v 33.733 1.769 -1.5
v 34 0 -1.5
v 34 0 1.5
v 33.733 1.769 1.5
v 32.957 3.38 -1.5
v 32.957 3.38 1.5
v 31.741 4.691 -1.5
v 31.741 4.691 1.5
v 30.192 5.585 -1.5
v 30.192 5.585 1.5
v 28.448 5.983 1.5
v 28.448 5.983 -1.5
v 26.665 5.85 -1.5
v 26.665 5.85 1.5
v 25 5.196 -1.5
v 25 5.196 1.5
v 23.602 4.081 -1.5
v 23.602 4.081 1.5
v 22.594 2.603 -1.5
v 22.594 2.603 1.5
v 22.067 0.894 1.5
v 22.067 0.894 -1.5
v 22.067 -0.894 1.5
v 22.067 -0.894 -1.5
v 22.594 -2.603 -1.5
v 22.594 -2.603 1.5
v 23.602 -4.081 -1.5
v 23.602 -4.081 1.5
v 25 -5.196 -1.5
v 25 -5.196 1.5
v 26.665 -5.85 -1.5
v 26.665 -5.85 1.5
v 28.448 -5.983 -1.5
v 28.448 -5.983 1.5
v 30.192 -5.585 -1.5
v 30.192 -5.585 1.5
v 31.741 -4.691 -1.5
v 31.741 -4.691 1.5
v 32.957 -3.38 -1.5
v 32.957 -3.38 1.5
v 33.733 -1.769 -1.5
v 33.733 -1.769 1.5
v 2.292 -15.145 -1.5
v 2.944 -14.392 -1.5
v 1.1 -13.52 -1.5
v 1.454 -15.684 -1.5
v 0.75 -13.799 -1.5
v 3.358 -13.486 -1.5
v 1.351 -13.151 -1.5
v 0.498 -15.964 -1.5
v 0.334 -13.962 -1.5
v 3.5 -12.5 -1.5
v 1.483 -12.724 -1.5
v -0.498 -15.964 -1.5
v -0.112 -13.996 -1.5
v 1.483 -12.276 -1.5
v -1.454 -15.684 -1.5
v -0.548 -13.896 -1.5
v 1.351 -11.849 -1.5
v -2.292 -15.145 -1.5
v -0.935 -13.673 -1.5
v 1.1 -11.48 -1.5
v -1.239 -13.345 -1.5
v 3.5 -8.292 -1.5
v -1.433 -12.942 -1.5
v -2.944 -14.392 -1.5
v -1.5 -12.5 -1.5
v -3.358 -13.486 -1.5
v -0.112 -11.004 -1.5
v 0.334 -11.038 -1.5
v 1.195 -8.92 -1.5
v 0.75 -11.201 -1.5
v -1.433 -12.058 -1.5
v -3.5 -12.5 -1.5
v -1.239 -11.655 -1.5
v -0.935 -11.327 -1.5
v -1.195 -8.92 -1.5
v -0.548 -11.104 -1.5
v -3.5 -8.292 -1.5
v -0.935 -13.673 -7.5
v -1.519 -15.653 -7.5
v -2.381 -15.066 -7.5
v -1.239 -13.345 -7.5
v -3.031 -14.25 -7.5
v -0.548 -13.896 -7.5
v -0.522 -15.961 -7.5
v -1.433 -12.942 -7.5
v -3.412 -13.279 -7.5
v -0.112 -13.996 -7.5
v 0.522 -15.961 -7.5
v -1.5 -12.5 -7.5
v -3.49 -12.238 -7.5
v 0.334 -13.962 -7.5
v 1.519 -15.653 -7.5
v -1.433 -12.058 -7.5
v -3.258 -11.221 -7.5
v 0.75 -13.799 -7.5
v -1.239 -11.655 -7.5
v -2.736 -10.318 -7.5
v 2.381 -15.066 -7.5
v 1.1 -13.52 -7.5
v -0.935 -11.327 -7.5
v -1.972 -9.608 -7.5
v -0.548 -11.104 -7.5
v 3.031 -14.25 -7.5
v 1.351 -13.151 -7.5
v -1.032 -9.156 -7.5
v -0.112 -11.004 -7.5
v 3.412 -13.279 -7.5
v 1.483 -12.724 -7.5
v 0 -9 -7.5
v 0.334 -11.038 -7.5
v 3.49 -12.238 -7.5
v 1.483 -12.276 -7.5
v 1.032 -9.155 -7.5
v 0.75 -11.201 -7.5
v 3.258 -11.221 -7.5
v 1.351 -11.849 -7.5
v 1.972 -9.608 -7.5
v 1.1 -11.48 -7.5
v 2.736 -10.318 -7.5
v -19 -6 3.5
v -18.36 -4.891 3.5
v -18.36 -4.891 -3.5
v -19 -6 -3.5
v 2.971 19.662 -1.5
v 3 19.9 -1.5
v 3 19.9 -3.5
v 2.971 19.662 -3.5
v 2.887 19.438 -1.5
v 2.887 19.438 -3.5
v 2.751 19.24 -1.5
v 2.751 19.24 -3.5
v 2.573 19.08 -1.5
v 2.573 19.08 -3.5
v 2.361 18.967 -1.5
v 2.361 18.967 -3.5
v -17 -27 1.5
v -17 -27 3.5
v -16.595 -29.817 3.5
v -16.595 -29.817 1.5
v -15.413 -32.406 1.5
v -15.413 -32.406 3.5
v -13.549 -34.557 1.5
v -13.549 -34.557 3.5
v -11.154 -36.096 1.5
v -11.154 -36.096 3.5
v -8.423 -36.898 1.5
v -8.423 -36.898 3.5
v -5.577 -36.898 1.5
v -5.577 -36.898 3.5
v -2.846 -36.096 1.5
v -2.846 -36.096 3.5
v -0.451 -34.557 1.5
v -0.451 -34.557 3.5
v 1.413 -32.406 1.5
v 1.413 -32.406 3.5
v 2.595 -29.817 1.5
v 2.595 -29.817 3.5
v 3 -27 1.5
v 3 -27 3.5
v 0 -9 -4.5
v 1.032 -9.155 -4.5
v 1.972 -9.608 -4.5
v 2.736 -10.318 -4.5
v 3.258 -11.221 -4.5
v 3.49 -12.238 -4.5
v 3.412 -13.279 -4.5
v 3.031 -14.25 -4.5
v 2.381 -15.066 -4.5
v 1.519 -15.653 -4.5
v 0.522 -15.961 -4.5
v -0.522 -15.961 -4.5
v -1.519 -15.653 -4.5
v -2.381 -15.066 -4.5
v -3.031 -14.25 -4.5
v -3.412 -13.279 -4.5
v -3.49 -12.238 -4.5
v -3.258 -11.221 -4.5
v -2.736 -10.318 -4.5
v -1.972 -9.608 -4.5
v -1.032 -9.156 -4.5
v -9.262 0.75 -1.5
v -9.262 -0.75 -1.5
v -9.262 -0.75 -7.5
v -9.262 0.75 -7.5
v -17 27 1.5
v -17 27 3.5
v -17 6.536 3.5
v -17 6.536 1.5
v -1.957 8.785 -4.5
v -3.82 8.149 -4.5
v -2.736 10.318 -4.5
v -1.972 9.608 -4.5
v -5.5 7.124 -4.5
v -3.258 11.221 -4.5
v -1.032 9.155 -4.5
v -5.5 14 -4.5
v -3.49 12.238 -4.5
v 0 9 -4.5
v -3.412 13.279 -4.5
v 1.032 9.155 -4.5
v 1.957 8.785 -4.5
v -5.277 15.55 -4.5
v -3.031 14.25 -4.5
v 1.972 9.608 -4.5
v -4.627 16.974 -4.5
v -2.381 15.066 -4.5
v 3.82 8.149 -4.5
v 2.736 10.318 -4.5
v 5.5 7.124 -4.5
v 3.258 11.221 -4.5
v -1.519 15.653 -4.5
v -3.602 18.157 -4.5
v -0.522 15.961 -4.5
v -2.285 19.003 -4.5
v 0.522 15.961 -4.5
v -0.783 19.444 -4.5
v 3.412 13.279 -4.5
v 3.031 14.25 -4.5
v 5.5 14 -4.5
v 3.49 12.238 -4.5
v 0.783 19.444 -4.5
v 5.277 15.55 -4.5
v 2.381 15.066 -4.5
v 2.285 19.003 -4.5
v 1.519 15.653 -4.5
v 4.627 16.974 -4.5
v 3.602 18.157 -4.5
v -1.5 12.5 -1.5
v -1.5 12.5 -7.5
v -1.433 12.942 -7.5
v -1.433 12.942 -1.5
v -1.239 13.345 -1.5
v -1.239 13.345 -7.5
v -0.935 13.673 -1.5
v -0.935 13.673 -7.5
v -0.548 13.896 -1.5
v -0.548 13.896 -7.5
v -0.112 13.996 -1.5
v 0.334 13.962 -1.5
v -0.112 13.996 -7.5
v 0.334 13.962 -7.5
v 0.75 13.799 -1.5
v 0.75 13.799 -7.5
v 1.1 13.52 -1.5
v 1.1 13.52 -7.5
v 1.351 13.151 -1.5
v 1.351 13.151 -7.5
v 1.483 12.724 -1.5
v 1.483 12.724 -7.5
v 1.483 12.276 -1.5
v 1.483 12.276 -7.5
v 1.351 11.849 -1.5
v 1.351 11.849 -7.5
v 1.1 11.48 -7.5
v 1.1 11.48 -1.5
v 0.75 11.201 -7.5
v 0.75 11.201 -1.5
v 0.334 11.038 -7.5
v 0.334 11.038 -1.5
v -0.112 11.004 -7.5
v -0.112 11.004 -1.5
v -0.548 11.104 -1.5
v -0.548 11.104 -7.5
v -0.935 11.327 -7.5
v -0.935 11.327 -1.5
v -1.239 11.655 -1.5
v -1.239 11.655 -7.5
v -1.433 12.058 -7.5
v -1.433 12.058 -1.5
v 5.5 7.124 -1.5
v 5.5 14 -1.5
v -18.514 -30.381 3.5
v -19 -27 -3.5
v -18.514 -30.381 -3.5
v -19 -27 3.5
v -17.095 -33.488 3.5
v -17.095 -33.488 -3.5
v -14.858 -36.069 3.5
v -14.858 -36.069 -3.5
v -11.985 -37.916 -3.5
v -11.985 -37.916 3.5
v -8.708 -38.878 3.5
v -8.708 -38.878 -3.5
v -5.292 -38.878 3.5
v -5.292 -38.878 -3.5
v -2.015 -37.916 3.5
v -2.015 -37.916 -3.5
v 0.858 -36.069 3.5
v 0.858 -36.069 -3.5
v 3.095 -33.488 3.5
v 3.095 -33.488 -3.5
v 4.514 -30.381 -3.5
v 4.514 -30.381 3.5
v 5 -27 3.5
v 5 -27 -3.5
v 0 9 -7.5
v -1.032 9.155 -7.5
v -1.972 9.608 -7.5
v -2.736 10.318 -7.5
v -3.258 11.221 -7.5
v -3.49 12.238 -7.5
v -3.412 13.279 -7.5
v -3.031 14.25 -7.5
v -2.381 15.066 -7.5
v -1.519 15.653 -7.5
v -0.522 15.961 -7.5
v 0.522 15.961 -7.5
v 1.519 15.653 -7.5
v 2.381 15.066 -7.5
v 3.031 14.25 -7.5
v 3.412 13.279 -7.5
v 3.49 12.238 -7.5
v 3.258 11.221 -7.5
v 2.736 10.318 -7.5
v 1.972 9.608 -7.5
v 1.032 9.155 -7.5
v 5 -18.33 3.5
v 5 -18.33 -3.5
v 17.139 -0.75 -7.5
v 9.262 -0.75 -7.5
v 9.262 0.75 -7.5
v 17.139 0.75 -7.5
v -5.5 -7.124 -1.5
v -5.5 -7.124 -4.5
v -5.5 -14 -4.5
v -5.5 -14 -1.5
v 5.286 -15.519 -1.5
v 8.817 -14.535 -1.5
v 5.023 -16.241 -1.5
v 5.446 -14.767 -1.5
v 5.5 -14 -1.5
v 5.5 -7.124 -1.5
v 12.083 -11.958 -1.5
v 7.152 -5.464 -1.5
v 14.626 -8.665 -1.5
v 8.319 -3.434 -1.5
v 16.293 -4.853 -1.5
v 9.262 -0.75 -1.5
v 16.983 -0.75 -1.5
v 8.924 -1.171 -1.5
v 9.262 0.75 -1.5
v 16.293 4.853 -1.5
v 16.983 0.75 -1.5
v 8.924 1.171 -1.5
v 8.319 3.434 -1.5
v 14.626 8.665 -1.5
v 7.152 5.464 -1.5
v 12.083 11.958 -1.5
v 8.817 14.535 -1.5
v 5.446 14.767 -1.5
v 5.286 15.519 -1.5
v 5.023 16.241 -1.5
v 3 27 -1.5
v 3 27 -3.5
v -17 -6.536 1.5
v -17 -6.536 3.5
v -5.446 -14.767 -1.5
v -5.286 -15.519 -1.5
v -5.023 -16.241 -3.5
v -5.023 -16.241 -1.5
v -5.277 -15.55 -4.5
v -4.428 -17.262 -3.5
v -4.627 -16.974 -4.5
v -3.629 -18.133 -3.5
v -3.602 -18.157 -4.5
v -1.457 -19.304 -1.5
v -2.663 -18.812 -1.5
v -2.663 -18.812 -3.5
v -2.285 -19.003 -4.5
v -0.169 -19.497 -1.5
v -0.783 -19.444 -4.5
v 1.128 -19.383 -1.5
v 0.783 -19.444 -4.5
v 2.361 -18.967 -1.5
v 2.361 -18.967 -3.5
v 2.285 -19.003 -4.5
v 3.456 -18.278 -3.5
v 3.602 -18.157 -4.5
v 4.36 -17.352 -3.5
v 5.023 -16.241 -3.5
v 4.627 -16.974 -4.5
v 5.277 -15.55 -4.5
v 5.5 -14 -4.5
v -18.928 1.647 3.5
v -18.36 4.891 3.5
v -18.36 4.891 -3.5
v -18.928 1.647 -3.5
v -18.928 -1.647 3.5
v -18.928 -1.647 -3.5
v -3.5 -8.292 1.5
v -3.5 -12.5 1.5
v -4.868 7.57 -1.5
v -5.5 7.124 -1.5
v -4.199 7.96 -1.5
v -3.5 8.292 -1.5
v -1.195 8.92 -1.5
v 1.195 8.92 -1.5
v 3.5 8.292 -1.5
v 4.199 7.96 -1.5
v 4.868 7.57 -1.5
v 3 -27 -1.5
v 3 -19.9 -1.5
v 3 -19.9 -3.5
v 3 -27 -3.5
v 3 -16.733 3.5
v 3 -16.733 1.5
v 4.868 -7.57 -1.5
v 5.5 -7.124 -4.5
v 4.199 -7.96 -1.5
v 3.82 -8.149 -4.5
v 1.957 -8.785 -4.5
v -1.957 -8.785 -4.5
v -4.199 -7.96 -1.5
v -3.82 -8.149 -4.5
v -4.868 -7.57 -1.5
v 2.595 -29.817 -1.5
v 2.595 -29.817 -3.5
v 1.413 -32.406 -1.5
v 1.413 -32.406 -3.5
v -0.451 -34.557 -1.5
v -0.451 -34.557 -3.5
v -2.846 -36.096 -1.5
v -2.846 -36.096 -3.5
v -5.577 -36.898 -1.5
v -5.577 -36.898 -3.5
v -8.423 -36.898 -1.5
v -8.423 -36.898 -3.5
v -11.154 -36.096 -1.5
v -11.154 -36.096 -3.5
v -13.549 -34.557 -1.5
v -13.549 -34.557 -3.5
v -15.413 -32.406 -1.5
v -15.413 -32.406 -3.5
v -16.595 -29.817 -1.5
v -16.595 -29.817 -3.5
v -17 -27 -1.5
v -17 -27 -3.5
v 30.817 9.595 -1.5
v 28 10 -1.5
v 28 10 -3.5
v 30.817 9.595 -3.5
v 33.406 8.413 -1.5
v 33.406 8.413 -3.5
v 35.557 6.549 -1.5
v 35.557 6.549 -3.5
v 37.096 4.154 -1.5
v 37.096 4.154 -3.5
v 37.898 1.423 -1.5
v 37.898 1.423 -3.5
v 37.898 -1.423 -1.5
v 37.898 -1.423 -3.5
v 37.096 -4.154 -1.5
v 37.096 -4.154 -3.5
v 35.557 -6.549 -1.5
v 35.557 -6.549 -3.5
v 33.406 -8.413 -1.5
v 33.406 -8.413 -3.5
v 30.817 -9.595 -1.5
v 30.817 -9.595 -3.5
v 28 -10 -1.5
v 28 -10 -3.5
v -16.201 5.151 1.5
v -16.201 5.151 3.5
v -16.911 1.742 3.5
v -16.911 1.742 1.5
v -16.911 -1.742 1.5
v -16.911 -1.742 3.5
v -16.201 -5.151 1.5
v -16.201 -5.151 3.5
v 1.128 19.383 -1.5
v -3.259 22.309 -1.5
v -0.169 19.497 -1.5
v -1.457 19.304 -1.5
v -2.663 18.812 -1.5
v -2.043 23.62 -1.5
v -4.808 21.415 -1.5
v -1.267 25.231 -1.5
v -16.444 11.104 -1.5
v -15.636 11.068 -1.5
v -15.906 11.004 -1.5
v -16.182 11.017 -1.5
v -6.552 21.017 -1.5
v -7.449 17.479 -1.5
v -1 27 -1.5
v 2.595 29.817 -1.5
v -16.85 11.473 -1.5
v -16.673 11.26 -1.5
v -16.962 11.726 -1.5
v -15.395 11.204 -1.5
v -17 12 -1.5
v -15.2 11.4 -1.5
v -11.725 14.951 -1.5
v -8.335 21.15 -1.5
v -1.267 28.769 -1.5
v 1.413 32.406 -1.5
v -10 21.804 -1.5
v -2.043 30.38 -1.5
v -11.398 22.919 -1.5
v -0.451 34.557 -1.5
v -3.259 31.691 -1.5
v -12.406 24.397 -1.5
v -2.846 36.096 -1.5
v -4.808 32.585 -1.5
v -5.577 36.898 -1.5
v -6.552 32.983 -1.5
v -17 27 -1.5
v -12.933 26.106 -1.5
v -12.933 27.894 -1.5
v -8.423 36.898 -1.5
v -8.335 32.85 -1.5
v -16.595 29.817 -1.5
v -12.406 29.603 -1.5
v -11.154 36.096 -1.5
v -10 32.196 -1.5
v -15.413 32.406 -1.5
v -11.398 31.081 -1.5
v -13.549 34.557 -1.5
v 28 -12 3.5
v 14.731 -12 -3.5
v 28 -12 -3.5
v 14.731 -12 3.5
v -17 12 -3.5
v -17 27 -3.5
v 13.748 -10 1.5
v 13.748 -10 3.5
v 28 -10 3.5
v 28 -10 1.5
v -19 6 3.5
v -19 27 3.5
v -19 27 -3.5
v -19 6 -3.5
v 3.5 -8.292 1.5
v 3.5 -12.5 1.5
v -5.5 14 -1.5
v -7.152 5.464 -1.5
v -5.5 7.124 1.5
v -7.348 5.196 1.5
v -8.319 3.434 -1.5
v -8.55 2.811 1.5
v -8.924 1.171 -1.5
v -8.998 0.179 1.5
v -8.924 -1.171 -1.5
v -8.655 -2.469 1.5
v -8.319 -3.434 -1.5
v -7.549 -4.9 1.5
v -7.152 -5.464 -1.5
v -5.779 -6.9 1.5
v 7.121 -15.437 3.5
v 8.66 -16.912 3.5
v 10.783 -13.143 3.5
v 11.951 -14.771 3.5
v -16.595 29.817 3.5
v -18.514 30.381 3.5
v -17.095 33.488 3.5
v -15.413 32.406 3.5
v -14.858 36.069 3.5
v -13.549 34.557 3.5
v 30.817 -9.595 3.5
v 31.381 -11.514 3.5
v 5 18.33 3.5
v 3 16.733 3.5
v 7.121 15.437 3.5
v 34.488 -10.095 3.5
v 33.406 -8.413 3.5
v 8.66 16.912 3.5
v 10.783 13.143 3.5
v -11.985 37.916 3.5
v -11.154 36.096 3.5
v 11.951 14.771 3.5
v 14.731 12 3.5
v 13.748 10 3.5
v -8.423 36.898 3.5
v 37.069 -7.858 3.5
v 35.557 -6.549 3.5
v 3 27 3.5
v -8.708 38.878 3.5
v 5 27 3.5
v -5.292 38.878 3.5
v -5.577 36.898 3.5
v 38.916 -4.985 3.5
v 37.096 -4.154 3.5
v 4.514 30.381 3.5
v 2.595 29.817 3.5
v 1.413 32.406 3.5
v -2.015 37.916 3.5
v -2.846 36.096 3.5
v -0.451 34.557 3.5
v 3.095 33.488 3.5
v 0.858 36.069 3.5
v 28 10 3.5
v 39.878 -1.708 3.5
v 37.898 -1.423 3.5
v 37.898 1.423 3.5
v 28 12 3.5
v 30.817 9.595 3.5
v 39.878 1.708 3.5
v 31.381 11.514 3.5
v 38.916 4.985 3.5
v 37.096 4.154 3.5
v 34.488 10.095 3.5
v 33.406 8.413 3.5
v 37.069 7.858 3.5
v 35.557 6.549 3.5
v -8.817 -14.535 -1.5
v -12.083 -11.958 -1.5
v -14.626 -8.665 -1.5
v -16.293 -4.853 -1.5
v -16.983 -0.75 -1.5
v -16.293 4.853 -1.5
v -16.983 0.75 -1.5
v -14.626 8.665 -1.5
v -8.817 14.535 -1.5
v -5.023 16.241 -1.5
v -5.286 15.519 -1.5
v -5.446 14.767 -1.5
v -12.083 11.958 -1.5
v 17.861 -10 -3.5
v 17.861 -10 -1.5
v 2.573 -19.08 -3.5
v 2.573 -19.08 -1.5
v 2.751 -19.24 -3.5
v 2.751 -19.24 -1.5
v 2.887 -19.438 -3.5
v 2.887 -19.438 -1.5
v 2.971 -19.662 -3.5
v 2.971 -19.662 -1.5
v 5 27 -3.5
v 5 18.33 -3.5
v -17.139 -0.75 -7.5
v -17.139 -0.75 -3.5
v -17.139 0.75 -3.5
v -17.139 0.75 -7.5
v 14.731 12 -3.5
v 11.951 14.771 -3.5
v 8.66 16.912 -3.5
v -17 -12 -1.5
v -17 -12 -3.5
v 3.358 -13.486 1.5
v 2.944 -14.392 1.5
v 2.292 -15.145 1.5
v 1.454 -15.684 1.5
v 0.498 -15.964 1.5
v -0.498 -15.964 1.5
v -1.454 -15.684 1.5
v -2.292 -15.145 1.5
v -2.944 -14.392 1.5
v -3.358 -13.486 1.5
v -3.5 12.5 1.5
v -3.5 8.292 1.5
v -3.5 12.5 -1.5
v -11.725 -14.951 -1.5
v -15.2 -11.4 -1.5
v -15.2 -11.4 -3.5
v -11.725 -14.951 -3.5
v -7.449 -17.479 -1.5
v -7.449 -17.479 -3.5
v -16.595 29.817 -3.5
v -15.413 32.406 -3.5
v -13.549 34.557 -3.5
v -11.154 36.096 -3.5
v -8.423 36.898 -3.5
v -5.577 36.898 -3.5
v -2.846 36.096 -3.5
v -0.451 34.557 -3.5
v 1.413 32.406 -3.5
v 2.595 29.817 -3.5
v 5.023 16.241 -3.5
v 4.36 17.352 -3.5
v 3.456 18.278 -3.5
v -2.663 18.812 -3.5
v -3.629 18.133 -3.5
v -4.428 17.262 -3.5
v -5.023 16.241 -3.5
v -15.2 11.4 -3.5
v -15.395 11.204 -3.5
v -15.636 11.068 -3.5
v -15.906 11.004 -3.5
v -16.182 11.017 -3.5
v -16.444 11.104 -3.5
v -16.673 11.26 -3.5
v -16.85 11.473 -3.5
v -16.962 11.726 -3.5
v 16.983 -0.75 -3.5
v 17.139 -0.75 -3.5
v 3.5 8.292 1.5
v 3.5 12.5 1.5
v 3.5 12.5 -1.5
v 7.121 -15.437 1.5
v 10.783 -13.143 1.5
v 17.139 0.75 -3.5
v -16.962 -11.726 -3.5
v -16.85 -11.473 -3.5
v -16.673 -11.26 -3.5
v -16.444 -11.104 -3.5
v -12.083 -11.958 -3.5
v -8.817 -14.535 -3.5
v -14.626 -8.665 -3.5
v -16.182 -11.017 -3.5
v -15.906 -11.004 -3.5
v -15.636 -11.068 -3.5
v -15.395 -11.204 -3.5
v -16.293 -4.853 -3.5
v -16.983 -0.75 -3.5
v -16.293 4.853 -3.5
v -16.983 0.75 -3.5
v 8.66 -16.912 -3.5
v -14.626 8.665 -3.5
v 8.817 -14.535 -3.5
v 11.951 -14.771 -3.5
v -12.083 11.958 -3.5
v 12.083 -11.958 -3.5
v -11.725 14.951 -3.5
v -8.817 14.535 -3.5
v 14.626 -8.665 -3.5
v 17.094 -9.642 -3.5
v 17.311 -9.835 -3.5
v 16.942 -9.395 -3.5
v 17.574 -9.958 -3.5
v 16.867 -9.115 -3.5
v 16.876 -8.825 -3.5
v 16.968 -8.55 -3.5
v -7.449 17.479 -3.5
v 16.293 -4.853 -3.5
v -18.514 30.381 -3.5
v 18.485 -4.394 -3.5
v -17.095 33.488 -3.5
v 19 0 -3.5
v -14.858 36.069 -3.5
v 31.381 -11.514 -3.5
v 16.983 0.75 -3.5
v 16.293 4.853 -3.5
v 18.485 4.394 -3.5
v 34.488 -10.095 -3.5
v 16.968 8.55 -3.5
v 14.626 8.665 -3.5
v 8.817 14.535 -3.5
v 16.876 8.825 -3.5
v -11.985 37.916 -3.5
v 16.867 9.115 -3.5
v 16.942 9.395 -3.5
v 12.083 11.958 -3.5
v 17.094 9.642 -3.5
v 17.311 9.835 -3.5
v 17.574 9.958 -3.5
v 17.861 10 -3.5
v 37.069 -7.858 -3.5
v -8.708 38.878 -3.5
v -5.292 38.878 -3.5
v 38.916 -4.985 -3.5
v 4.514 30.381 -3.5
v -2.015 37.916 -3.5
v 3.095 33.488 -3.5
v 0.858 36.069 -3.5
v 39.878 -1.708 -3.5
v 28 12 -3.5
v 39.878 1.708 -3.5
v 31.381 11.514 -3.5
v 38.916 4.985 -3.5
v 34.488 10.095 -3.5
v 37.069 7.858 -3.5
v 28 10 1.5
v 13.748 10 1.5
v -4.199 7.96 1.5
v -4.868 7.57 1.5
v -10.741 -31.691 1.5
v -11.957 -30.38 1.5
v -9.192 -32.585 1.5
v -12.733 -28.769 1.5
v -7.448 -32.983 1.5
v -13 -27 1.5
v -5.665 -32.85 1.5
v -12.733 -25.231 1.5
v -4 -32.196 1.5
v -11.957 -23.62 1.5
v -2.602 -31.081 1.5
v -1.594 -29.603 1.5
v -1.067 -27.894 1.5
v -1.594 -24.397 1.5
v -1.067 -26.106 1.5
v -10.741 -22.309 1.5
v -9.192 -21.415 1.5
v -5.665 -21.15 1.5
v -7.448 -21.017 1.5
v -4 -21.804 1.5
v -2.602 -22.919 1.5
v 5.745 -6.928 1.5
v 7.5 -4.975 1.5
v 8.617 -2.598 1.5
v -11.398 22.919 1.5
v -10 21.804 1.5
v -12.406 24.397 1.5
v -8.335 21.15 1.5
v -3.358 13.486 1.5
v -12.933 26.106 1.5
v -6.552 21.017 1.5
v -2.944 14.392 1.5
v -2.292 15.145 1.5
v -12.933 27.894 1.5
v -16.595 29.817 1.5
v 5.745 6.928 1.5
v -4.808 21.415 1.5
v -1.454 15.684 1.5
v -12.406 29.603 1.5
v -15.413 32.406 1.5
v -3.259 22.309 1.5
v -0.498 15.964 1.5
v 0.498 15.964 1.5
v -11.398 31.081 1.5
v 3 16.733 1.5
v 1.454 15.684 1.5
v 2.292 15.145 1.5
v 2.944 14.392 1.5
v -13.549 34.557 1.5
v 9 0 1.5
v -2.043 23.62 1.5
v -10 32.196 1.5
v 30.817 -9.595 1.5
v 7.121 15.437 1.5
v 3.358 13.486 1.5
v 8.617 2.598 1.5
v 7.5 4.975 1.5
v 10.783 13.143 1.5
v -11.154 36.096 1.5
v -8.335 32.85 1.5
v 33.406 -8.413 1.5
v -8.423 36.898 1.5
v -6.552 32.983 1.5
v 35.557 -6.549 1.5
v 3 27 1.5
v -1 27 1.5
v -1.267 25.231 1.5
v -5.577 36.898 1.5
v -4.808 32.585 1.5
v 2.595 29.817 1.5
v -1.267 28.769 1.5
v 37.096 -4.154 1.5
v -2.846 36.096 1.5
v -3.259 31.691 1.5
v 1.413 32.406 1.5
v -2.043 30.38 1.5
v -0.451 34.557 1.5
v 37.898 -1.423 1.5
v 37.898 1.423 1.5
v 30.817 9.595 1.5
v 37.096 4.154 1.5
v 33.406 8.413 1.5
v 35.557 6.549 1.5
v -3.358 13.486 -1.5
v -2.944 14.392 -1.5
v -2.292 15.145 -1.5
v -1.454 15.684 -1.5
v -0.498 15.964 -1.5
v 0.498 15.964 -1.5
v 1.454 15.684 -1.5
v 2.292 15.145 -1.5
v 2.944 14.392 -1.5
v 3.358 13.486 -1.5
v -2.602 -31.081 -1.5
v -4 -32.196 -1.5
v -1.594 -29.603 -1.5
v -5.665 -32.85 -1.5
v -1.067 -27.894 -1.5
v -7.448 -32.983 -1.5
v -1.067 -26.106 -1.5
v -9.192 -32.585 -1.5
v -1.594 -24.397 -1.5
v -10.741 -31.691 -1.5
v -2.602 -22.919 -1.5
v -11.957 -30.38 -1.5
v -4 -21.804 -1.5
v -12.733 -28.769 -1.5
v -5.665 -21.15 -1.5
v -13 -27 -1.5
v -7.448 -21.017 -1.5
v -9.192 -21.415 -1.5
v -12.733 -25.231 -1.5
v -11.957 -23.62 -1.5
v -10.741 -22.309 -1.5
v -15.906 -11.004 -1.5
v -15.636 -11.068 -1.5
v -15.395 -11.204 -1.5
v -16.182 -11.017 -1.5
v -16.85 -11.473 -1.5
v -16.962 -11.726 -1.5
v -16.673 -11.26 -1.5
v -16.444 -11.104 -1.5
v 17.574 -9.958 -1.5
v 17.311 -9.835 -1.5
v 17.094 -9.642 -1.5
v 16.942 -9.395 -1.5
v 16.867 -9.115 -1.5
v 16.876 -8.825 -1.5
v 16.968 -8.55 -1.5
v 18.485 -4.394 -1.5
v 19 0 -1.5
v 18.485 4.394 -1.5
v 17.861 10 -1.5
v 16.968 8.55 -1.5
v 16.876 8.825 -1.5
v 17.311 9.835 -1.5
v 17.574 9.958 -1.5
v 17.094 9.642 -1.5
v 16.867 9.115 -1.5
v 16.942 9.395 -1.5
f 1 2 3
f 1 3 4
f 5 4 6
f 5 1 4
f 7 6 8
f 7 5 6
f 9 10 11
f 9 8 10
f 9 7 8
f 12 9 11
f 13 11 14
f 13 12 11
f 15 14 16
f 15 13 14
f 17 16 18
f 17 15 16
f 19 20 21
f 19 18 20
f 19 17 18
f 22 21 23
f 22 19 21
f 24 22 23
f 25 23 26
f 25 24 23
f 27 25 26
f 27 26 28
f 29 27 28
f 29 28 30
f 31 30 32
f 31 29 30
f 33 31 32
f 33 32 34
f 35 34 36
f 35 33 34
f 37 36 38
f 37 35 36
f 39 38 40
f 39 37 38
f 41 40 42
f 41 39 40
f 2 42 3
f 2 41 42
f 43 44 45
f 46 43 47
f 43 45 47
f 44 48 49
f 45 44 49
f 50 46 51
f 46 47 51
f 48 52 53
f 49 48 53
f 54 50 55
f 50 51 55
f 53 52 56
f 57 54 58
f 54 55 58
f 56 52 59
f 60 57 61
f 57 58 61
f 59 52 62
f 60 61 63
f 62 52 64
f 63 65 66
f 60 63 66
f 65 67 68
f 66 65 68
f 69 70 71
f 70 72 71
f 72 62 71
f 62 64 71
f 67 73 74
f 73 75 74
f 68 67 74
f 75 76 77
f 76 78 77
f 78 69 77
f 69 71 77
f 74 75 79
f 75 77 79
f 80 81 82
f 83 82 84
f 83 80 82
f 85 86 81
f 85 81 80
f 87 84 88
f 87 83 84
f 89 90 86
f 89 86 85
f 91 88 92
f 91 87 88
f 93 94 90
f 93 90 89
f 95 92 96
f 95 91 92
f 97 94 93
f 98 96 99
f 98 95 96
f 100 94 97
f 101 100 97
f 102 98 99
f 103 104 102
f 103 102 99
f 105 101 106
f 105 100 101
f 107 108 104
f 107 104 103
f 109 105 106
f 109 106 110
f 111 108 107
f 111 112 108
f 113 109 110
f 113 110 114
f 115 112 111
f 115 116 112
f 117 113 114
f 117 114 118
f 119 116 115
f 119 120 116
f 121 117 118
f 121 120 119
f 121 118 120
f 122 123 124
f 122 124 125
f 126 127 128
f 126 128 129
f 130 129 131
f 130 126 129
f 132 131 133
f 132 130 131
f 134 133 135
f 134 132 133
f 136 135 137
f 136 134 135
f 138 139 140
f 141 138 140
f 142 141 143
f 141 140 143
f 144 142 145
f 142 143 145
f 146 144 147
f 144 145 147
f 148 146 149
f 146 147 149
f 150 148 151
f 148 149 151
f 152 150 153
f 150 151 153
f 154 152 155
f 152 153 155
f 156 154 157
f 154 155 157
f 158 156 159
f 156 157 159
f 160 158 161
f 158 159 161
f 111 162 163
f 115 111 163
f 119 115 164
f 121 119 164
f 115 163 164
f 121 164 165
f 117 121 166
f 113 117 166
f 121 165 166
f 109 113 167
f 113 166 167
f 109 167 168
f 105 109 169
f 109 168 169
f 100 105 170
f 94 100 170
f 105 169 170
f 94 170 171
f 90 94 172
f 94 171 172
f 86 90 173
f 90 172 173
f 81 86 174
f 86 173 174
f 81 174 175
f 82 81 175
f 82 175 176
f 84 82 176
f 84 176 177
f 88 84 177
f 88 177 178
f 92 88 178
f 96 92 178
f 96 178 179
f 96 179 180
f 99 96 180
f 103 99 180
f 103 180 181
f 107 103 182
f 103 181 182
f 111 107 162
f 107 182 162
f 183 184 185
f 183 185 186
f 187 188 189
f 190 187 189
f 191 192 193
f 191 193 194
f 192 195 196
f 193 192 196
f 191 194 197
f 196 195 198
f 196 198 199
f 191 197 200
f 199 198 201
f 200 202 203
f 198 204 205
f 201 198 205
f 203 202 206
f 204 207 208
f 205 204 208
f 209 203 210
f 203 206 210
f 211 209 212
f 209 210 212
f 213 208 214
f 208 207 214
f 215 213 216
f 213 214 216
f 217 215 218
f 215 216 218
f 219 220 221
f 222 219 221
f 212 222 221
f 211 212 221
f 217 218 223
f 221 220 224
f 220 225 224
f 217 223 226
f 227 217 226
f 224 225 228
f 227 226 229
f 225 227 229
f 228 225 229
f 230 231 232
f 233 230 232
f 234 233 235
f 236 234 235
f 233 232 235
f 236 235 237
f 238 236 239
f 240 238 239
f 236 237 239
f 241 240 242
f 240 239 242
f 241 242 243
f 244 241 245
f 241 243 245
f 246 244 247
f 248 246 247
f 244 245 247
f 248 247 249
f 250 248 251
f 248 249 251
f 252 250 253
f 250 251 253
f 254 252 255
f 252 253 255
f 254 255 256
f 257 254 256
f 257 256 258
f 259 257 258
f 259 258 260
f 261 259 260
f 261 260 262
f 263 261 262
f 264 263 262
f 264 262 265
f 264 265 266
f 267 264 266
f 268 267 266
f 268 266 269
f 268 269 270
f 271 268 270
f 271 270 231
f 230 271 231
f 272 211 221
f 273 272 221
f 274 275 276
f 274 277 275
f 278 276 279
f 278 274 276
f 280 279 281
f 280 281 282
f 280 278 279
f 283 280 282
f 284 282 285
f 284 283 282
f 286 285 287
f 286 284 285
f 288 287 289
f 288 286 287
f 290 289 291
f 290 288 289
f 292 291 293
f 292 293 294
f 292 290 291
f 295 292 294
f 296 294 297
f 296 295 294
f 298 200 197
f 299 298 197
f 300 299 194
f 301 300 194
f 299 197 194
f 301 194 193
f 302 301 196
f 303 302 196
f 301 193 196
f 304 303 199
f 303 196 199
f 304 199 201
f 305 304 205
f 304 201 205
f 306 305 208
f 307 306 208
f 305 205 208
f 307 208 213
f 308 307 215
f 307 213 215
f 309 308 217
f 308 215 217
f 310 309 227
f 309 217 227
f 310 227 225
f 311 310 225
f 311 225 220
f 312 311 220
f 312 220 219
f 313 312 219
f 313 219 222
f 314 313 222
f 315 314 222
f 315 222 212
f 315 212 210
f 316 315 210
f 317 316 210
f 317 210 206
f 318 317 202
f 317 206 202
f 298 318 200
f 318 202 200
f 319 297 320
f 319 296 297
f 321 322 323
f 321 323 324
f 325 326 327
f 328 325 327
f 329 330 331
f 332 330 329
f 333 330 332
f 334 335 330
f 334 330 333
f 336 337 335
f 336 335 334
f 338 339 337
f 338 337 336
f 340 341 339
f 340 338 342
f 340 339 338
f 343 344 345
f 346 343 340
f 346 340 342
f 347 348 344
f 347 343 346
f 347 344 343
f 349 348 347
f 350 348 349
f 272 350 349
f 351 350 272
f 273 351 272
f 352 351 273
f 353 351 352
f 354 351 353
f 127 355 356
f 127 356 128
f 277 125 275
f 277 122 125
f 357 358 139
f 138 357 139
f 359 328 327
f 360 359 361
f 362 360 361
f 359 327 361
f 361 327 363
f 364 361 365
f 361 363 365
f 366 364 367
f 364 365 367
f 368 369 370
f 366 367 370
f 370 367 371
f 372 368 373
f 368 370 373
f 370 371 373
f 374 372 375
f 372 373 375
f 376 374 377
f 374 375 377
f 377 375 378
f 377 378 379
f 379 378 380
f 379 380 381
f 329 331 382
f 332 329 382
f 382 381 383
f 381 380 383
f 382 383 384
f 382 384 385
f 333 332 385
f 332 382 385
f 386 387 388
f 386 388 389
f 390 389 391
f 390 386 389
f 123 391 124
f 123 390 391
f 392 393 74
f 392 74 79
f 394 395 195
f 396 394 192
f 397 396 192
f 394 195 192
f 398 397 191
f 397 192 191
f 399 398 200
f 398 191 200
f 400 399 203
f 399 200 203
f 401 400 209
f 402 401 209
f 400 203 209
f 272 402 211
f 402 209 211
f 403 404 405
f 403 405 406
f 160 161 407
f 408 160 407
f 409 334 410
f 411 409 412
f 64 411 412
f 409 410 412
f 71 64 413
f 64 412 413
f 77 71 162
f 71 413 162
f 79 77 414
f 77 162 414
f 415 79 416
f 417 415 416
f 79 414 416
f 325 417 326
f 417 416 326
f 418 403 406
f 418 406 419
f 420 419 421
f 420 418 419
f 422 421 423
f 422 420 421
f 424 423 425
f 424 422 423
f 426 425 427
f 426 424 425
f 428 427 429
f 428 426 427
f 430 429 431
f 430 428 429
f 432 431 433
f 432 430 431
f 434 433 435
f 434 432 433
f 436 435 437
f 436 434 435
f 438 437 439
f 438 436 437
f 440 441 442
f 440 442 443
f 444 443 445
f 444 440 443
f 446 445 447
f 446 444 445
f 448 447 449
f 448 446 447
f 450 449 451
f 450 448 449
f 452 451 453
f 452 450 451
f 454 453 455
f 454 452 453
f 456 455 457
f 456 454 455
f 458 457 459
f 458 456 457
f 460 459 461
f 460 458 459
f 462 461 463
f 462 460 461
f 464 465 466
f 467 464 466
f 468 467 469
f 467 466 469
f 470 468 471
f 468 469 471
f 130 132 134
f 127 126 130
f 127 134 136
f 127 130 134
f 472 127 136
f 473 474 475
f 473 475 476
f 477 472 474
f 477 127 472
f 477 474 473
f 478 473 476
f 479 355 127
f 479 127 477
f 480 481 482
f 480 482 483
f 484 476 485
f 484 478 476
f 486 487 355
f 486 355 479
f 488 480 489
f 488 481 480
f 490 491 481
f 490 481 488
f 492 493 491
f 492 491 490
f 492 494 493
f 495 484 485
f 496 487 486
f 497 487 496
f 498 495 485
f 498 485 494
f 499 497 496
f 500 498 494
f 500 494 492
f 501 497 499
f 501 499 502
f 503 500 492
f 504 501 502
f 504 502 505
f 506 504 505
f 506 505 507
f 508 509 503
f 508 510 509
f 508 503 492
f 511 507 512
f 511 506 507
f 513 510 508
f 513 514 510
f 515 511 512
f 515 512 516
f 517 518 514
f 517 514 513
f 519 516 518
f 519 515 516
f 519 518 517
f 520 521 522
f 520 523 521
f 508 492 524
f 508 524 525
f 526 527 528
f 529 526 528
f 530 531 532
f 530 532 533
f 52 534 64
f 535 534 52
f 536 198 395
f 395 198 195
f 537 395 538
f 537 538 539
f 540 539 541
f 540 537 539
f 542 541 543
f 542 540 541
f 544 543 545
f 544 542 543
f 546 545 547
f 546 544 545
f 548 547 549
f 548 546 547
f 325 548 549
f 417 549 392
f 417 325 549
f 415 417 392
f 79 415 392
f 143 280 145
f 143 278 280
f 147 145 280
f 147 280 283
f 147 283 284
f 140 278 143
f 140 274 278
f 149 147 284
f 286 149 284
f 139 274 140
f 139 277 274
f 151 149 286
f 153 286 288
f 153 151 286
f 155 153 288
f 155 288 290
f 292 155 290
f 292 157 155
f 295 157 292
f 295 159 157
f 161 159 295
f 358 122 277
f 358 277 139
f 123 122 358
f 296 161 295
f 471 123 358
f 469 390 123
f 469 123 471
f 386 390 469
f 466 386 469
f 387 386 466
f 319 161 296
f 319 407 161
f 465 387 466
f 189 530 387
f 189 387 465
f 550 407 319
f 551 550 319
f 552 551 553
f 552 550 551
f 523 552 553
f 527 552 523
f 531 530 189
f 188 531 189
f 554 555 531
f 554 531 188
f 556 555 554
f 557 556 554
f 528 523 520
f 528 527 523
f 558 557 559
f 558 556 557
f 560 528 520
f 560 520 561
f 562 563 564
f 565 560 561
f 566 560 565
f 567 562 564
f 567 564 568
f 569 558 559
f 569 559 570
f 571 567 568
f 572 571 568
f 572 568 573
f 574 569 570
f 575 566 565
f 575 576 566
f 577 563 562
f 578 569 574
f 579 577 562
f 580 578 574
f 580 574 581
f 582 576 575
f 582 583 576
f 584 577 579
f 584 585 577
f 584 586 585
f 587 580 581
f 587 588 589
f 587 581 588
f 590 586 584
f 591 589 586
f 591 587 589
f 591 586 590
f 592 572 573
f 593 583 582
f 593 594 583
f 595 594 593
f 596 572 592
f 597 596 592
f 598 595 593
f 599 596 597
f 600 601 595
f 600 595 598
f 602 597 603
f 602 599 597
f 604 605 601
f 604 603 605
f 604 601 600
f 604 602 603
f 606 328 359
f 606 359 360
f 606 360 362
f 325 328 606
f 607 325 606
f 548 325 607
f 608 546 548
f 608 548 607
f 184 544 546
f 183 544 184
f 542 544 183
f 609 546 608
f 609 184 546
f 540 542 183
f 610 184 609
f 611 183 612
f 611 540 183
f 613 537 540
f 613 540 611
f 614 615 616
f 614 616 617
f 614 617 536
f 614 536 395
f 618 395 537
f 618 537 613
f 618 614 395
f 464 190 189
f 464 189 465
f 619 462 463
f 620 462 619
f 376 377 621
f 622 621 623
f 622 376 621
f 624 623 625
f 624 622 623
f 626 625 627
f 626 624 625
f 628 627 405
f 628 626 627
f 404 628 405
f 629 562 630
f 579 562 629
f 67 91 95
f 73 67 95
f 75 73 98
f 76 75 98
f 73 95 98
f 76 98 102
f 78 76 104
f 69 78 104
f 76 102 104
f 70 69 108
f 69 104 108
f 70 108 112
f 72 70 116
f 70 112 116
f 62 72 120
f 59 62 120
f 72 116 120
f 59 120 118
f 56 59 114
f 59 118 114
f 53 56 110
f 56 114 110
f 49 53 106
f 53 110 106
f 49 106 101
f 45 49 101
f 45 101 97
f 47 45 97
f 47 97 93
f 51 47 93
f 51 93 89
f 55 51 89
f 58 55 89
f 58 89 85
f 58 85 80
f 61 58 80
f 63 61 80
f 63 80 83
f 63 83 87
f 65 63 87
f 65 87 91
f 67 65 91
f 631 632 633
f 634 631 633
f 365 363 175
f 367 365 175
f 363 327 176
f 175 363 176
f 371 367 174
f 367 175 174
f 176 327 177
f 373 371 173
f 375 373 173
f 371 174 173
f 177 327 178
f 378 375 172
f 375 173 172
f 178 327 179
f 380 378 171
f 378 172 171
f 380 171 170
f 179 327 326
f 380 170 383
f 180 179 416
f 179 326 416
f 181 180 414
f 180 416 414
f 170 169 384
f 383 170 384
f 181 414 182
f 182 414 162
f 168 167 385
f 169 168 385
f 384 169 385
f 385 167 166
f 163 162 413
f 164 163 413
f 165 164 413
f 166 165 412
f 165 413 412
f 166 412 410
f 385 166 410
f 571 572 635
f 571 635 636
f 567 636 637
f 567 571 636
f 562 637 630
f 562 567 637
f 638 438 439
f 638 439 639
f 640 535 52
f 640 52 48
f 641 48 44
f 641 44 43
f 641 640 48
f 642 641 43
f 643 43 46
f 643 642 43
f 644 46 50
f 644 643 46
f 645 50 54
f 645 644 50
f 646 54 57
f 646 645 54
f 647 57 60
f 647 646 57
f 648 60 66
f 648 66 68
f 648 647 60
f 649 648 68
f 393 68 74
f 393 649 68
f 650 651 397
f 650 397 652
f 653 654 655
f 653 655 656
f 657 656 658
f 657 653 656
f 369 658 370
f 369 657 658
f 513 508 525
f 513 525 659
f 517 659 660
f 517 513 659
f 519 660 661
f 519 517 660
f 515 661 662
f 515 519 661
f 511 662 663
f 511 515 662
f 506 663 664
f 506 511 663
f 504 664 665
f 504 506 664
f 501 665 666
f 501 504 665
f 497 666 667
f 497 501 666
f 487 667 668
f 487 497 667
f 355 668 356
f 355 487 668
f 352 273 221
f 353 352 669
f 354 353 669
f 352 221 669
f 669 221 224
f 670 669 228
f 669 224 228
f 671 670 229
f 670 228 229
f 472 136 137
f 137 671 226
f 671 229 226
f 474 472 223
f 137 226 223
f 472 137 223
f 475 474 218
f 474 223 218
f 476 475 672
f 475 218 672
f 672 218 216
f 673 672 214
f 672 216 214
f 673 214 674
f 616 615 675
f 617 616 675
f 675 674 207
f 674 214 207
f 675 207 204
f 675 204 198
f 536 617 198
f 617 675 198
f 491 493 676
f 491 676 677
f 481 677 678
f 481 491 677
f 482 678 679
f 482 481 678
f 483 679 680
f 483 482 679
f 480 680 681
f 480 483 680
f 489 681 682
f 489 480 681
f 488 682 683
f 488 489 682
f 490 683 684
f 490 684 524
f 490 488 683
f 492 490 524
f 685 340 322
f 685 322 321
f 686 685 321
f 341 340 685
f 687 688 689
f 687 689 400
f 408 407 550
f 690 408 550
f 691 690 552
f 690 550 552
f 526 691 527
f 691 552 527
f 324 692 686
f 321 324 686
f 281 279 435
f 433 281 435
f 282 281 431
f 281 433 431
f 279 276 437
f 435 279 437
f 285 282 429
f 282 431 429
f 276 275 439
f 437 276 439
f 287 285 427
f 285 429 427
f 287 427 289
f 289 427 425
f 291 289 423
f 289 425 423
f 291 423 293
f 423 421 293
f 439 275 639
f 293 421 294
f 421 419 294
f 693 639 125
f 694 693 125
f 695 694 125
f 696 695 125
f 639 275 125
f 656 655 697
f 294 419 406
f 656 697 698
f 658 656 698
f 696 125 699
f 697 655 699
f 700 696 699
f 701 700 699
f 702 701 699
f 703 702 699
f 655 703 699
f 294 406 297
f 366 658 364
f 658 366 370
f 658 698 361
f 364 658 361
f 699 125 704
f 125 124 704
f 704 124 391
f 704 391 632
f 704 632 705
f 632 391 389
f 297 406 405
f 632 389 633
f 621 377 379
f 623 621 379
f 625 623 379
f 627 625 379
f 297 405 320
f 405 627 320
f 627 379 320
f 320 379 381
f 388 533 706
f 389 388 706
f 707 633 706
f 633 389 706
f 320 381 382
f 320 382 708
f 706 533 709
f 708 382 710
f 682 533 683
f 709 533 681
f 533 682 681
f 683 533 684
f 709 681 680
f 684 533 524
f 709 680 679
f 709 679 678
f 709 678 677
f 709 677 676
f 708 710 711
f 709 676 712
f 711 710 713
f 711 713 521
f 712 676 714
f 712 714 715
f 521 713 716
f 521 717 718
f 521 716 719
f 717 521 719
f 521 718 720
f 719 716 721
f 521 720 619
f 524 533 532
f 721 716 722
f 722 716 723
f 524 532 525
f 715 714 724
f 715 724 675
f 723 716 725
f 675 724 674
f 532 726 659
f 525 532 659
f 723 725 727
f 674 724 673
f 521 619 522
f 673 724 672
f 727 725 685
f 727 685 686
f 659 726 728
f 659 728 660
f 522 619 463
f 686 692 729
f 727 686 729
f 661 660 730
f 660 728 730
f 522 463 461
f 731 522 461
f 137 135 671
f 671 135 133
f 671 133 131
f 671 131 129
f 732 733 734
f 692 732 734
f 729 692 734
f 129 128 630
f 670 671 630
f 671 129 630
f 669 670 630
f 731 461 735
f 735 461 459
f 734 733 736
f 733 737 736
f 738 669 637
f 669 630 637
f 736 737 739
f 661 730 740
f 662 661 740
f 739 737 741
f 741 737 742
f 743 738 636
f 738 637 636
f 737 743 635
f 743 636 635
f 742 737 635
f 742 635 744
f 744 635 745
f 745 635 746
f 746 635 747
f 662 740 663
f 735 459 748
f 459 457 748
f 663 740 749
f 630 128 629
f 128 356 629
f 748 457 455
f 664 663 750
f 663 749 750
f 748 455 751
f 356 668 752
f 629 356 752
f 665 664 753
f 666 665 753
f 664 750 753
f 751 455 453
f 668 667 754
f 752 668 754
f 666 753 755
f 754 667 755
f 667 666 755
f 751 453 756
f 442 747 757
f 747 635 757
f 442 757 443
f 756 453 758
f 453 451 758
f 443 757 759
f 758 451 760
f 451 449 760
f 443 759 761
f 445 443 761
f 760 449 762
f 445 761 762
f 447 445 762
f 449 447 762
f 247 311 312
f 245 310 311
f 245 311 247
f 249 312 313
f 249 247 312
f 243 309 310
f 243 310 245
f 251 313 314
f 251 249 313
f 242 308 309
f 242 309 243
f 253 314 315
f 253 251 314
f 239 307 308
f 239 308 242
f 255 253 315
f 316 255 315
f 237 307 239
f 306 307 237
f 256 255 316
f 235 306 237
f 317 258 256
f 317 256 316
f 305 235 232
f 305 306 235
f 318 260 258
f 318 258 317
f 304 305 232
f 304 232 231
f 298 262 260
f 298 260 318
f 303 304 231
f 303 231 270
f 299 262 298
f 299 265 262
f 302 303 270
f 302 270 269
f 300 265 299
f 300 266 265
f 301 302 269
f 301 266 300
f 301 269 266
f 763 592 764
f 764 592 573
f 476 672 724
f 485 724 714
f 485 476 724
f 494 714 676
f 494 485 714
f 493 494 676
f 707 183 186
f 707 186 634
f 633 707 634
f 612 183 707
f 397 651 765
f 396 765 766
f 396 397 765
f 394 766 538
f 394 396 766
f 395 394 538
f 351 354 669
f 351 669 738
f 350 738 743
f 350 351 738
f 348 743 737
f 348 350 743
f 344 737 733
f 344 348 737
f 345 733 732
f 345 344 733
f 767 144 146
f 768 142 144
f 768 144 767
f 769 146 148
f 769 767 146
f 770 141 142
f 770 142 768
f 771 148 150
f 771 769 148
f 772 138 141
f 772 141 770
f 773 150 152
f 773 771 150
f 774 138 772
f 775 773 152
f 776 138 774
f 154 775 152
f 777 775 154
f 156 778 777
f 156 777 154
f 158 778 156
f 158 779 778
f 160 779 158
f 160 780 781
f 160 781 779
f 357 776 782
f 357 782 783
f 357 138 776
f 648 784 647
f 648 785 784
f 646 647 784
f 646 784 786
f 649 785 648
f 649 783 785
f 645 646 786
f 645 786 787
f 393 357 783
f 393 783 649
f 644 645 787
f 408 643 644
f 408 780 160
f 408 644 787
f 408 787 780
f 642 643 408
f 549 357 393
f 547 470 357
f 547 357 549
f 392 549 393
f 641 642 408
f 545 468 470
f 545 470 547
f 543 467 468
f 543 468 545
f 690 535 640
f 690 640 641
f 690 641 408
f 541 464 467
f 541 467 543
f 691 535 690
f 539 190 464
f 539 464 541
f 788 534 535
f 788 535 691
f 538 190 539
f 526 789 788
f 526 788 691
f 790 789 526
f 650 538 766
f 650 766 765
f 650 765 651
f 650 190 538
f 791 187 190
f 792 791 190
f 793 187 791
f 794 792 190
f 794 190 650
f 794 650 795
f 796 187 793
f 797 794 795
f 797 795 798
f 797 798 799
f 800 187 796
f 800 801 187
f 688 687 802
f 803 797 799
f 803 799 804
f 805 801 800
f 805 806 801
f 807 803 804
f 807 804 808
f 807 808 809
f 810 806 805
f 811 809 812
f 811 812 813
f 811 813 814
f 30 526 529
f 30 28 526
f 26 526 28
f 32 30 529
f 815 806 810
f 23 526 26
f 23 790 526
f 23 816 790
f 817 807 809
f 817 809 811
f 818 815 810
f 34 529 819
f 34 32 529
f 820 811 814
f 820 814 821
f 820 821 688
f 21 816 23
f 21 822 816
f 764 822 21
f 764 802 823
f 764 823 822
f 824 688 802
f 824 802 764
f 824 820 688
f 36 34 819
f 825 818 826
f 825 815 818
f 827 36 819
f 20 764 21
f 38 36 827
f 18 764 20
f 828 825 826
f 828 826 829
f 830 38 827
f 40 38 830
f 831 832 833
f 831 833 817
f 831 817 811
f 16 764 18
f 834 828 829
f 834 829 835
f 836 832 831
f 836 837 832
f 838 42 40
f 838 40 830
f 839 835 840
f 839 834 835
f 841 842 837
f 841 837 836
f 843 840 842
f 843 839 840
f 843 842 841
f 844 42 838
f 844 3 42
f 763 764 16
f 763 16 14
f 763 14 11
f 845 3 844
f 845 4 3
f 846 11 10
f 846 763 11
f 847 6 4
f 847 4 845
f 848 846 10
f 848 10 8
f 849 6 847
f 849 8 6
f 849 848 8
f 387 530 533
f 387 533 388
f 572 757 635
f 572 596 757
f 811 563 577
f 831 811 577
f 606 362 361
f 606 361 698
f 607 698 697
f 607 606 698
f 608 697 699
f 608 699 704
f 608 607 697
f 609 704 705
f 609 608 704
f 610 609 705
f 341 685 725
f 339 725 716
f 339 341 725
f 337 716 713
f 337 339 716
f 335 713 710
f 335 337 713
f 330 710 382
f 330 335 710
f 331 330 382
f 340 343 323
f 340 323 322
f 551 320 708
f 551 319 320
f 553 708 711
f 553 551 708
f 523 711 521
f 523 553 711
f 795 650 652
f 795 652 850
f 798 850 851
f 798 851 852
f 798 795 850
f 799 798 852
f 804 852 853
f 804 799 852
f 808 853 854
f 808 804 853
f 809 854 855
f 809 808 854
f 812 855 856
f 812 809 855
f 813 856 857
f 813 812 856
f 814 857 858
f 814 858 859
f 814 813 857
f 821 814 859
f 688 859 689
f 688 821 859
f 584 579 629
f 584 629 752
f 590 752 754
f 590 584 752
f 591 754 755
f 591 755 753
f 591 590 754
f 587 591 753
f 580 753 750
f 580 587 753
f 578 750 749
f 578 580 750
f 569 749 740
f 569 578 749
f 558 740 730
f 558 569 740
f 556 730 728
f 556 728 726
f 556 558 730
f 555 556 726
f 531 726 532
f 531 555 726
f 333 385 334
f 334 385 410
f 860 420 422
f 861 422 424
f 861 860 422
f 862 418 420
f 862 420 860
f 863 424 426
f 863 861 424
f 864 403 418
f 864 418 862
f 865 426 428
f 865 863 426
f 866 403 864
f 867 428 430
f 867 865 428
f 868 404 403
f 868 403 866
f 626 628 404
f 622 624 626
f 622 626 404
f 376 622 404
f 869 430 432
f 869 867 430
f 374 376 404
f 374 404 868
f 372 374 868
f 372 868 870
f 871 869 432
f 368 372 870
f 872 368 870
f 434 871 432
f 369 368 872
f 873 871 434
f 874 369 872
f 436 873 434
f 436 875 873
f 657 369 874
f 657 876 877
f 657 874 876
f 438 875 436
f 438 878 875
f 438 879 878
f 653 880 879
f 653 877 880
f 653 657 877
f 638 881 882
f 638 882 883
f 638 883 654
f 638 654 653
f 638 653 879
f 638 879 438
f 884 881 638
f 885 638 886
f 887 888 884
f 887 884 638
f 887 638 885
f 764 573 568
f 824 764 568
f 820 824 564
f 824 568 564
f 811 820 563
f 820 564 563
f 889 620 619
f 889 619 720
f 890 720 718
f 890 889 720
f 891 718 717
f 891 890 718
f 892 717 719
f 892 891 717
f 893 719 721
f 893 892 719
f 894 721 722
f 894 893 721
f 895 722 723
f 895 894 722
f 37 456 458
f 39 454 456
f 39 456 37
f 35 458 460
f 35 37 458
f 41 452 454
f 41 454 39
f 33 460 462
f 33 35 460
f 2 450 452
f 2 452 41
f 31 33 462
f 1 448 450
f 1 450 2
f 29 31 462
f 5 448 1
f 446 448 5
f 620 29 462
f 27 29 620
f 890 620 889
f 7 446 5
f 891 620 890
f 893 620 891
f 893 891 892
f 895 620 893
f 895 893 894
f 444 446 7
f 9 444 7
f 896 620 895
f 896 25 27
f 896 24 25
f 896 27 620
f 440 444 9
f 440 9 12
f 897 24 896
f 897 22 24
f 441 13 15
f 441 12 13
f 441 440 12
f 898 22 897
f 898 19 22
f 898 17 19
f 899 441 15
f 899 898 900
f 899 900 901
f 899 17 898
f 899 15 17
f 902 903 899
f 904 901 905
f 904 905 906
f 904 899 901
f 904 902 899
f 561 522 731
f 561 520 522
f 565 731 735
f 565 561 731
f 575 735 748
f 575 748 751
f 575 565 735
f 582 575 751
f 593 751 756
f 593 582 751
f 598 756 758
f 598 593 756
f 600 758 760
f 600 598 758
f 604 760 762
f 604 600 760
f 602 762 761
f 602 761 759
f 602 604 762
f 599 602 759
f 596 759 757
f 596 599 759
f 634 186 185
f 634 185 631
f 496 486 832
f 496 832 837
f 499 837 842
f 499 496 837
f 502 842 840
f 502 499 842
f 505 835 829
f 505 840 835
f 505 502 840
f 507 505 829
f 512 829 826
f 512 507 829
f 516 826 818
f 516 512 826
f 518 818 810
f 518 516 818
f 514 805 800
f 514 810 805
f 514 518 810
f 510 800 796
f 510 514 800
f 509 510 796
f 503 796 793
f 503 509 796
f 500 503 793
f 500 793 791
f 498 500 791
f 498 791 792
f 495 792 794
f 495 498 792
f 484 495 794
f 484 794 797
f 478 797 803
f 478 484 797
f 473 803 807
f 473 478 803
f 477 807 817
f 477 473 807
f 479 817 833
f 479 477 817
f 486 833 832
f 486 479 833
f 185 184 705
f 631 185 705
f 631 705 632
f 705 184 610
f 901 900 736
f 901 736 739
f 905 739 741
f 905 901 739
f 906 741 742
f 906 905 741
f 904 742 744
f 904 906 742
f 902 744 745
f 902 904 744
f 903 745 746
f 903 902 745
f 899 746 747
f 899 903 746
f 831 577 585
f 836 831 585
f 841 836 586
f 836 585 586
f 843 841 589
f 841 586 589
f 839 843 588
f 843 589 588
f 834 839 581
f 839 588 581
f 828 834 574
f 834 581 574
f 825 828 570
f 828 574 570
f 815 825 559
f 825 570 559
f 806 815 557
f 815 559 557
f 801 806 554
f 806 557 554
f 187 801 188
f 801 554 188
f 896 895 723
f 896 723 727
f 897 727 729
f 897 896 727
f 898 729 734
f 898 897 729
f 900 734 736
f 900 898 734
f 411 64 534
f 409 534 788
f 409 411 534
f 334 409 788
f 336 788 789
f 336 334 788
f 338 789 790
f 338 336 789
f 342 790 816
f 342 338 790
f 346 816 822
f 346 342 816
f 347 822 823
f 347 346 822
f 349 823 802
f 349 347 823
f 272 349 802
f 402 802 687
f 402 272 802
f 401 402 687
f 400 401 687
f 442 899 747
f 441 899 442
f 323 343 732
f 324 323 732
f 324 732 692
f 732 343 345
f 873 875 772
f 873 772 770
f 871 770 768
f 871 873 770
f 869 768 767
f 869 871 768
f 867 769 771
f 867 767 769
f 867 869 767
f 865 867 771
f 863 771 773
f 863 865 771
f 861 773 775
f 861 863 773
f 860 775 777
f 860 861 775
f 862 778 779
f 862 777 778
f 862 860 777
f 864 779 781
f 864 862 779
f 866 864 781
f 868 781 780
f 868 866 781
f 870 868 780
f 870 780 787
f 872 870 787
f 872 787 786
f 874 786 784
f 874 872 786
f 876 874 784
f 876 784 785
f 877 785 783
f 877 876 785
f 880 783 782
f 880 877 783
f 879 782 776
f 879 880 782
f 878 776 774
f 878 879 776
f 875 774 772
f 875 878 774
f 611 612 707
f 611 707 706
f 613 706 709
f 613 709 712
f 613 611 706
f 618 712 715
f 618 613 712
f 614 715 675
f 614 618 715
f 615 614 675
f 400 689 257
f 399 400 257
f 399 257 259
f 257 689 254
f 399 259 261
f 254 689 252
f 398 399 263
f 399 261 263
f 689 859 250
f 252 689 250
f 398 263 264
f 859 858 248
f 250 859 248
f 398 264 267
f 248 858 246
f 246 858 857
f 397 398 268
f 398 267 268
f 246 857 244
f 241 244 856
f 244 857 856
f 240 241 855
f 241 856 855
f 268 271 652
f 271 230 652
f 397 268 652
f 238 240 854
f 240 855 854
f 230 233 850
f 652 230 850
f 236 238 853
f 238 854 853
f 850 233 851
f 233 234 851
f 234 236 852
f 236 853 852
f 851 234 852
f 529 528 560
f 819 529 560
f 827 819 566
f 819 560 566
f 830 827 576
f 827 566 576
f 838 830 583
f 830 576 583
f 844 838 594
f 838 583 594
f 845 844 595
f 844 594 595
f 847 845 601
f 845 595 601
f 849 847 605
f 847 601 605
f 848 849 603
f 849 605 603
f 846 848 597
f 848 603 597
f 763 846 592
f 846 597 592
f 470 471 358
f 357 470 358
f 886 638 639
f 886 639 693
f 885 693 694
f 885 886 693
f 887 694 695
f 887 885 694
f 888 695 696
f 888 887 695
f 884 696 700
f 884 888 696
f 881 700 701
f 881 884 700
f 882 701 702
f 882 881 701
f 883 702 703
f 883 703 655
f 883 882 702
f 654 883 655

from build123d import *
from build123d.topology import SkipClean

# Parameters (mm, degrees)
ESQUISSE1_R                  = 9
ESQUISSE1_R_2                = 6
EXTRUSION1_DEPTH             = 3.5
ENL_V_MAT_EXTRU_1_DEPTH      = 2
ENL_V_START                  = -2
ESQUISSE4_R                  = 17
ENL_V_MAT_EXTRU_2_DEPTH      = 2
ESQUISSE6_W                  = 7.877170109
ESQUISSE6_H                  = 1.5
EXTRUSION4_DEPTH             = 6
R_P_TITION_CIRCULAIRE1_COUNT = 2
EXTRUSION5_START             = 3
EXTRUSION5_DEPTH             = 3
ENL_V_MAT_EXTRU_3_DEPTH      = 3
ESQUISSE10_R                 = 3.5
EXTRUSION6_DEPTH             = 3
ESQUISSE11_R                 = 1.5
ENL_V_MAT_EXTRU_4_DEPTH      = 57.938563382


with BuildPart() as part:
    # Esquisse1 → Extrusion1 (new, symmetric)
    with BuildSketch(Plane.XY):
        with BuildLine():
            Line((28, 12), (14.730919863, 12))
            ThreePointArc((14.730919863, 12), (10.360766525, 15.926534997), (5, 18.33030278))
            Line((5, 18.33030278), (5, 27))
            ThreePointArc((5, 27), (-7, 39), (-19, 27))
            Line((-19, 27), (-19, 6))
            Line((-19, 6), (-18.35969719, 4.890963001))
            ThreePointArc((-18.35969719, 4.890963001), (-19, 0), (-18.35969719, -4.890963001))
            Line((-18.35969719, -4.890963001), (-19, -6))
            Line((-19, -6), (-19, -27))
            ThreePointArc((-19, -27), (-7, -39), (5, -27))
            Line((5, -27), (5, -18.33030278))
            ThreePointArc((5, -18.33030278), (10.360766525, -15.926534997), (14.730919863, -12))
            Line((14.730919863, -12), (28, -12))
            ThreePointArc((28, -12), (40, 0), (28, 12))
        make_face()
        with Locations(Location((0, 0, 0), (0, 0, 127.669886964))):
            Circle(ESQUISSE1_R, mode=Mode.SUBTRACT)
        with Locations(Location((-7, -27, 0), (0, 0, 180))):
            Circle(ESQUISSE1_R_2, mode=Mode.SUBTRACT)
        with Locations((-7, 27)):
            Circle(ESQUISSE1_R_2, mode=Mode.SUBTRACT)
        with Locations((28, 0)):
            Circle(ESQUISSE1_R_2, mode=Mode.SUBTRACT)
    extrude(amount=EXTRUSION1_DEPTH, both=True)

    # Esquisse3 → Enlèv. mat.-Extru.1 (cut)
    with BuildSketch(Plane.XY.offset(3.5)):
        with BuildLine():
            Line((-16.200693523, -5.151458956), (-17, -6.535898385))
            Line((-17, -6.535898385), (-17, -27))
            ThreePointArc((-17, -27), (-7, -37), (3, -27))
            Line((3, -27), (3, -16.733200531))
            ThreePointArc((3, -16.733200531), (9.025274953, -14.406401772), (13.747727085, -10))
            Line((13.747727085, -10), (28, -10))
            ThreePointArc((28, -10), (38, 0), (28, 10))
            Line((28, 10), (13.747727085, 10))
            ThreePointArc((13.747727085, 10), (9.025274953, 14.406401772), (3, 16.733200531))
            Line((3, 16.733200531), (3, 27))
            ThreePointArc((3, 27), (-7, 37), (-17, 27))
            Line((-17, 27), (-17, 6.535898385))
            Line((-17, 6.535898385), (-16.200693523, 5.151458956))
            ThreePointArc((-16.200693523, 5.151458956), (-17, 0), (-16.200693523, -5.151458956))
        make_face()
    extrude(amount=-ENL_V_MAT_EXTRU_1_DEPTH, mode=Mode.SUBTRACT)

    # Esquisse4 → Enlèv. mat.-Extru.2 (cut)
    with BuildSketch(Plane(origin=(0, 0, -3.5), x_dir=(-1, 0, 0), z_dir=(0, 0, -1)).offset(ENL_V_START)):
        Circle(ESQUISSE4_R)
        with BuildLine():
            Line((17, 12), (17, 27))
            ThreePointArc((17, 27), (7, 37), (-3, 27))
            Line((-3, 27), (-3, 19.899748742))
            ThreePointArc((-3, 19.899748742), (-2.670820393, 19.158128893), (-1.9, 18.904761305))
            ThreePointArc((-1.9, 18.904761305), (7.635630986, 17.398193568), (15.2, 11.4))
            ThreePointArc((15.2, 11.4), (16.316227766, 11.051316702), (17, 12))
        make_face()
        with BuildLine():
            Line((-17.860571099, 10), (-28, 10))
            ThreePointArc((-28, 10), (-38, 0), (-28, -10))
            Line((-28, -10), (-17.860571099, -10))
            ThreePointArc((-17.860571099, -10), (-17.009101781, -9.524404424), (-16.967542545, -8.55))
            ThreePointArc((-16.967542545, -8.55), (-19, 0), (-16.967542545, 8.55))
            ThreePointArc((-16.967542545, 8.55), (-17.009101781, 9.524404424), (-17.860571099, 10))
        make_face()
        with BuildLine():
            Line((-3, -19.899748742), (-3, -27))
            ThreePointArc((-3, -27), (7, -37), (17, -27))
            Line((17, -27), (17, -12))
            ThreePointArc((17, -12), (16.316227766, -11.051316702), (15.2, -11.4))
            ThreePointArc((15.2, -11.4), (7.635630986, -17.398193568), (-1.9, -18.904761305))
            ThreePointArc((-1.9, -18.904761305), (-2.670820393, -19.158128893), (-3, -19.899748742))
        make_face()
    extrude(amount=ENL_V_MAT_EXTRU_2_DEPTH, mode=Mode.SUBTRACT)

    # Esquisse6 → Extrusion4 (add)
    with BuildSketch(Plane(origin=(0, 0, -1.5), x_dir=(-1, 0, 0), z_dir=(0, 0, -1))):
        with Locations((13.200835764, 0)):
            Rectangle(ESQUISSE6_W, ESQUISSE6_H)
    extrusion4 = extrude(amount=EXTRUSION4_DEPTH)

    # Répétition circulaire1: Extrusion4 ×2 about axis
    r_p_tition_circulaire1_axis = Axis((0, 0, 0), (0, 0, 1))
    for i in range(1, R_P_TITION_CIRCULAIRE1_COUNT):
        add(extrusion4.rotate(r_p_tition_circulaire1_axis, i * 360 / R_P_TITION_CIRCULAIRE1_COUNT))

    # Esquisse7 → Extrusion5 (add)
    with SkipClean():  # the faces are left unmerged after this step: merging them gives an invalid solid
        with BuildSketch(Plane(origin=(0, 0, -1.5), x_dir=(-1, 0, 0), z_dir=(0, 0, -1)).offset(EXTRUSION5_START)):
            with BuildLine():
                Line((5.5, 14), (5.5, 7.123903424))
                ThreePointArc((5.5, 7.123903424), (0, 9), (-5.5, 7.123903424))
                Line((-5.5, 7.123903424), (-5.5, 14))
                ThreePointArc((-5.5, 14), (0, 19.5), (5.5, 14))
            make_face()
            with BuildLine():
                Line((-5.5, -14), (-5.5, -7.123903424))
                ThreePointArc((-5.5, -7.123903424), (0, -9), (5.5, -7.123903424))
                Line((5.5, -7.123903424), (5.5, -14))
                ThreePointArc((5.5, -14), (0, -19.5), (-5.5, -14))
            make_face()
        extrude(amount=-EXTRUSION5_DEPTH)

    # Esquisse8 → Enlèv. mat.-Extru.3 (cut)
    with SkipClean():  # the faces are left unmerged after this step: merging them gives an invalid solid
        with BuildSketch(Plane.XY.offset(1.5)):
            with BuildLine():
                Line((3.5, 12.5), (3.5, -12.5))
                ThreePointArc((3.5, -12.5), (0, -16), (-3.5, -12.5))
                Line((-3.5, -12.5), (-3.5, 12.5))
                ThreePointArc((-3.5, 12.5), (0, 16), (3.5, 12.5))
            make_face()
        extrude(amount=-ENL_V_MAT_EXTRU_3_DEPTH, mode=Mode.SUBTRACT)

    # Esquisse10 → Extrusion6 (add)
    with SkipClean():  # the faces are left unmerged after this step: merging them gives an invalid solid
        with BuildSketch(Plane(origin=(0, 0, -4.5), x_dir=(-1, 0, 0), z_dir=(0, 0, -1))):
            with Locations(Location((0, 12.5, 0), (0, 0, 270))):
                Circle(ESQUISSE10_R)
            with Locations(Location((0, -12.5, 0), (0, 0, 89.999632483))):
                Circle(ESQUISSE10_R)
        extrude(amount=EXTRUSION6_DEPTH)

    # Esquisse11 → Enlèv. mat.-Extru.4 (cut, through all)
    with SkipClean():  # the faces are left unmerged after this step: merging them gives an invalid solid
        with BuildSketch(Plane(origin=(0, 0, -7.5), x_dir=(-1, 0, 0), z_dir=(0, 0, -1))):
            with Locations((0, -12.5)):
                Circle(ESQUISSE11_R)
            with Locations((0, 12.5)):
                Circle(ESQUISSE11_R)
        extrude(amount=-ENL_V_MAT_EXTRU_4_DEPTH, mode=Mode.SUBTRACT)


solid = part.part
